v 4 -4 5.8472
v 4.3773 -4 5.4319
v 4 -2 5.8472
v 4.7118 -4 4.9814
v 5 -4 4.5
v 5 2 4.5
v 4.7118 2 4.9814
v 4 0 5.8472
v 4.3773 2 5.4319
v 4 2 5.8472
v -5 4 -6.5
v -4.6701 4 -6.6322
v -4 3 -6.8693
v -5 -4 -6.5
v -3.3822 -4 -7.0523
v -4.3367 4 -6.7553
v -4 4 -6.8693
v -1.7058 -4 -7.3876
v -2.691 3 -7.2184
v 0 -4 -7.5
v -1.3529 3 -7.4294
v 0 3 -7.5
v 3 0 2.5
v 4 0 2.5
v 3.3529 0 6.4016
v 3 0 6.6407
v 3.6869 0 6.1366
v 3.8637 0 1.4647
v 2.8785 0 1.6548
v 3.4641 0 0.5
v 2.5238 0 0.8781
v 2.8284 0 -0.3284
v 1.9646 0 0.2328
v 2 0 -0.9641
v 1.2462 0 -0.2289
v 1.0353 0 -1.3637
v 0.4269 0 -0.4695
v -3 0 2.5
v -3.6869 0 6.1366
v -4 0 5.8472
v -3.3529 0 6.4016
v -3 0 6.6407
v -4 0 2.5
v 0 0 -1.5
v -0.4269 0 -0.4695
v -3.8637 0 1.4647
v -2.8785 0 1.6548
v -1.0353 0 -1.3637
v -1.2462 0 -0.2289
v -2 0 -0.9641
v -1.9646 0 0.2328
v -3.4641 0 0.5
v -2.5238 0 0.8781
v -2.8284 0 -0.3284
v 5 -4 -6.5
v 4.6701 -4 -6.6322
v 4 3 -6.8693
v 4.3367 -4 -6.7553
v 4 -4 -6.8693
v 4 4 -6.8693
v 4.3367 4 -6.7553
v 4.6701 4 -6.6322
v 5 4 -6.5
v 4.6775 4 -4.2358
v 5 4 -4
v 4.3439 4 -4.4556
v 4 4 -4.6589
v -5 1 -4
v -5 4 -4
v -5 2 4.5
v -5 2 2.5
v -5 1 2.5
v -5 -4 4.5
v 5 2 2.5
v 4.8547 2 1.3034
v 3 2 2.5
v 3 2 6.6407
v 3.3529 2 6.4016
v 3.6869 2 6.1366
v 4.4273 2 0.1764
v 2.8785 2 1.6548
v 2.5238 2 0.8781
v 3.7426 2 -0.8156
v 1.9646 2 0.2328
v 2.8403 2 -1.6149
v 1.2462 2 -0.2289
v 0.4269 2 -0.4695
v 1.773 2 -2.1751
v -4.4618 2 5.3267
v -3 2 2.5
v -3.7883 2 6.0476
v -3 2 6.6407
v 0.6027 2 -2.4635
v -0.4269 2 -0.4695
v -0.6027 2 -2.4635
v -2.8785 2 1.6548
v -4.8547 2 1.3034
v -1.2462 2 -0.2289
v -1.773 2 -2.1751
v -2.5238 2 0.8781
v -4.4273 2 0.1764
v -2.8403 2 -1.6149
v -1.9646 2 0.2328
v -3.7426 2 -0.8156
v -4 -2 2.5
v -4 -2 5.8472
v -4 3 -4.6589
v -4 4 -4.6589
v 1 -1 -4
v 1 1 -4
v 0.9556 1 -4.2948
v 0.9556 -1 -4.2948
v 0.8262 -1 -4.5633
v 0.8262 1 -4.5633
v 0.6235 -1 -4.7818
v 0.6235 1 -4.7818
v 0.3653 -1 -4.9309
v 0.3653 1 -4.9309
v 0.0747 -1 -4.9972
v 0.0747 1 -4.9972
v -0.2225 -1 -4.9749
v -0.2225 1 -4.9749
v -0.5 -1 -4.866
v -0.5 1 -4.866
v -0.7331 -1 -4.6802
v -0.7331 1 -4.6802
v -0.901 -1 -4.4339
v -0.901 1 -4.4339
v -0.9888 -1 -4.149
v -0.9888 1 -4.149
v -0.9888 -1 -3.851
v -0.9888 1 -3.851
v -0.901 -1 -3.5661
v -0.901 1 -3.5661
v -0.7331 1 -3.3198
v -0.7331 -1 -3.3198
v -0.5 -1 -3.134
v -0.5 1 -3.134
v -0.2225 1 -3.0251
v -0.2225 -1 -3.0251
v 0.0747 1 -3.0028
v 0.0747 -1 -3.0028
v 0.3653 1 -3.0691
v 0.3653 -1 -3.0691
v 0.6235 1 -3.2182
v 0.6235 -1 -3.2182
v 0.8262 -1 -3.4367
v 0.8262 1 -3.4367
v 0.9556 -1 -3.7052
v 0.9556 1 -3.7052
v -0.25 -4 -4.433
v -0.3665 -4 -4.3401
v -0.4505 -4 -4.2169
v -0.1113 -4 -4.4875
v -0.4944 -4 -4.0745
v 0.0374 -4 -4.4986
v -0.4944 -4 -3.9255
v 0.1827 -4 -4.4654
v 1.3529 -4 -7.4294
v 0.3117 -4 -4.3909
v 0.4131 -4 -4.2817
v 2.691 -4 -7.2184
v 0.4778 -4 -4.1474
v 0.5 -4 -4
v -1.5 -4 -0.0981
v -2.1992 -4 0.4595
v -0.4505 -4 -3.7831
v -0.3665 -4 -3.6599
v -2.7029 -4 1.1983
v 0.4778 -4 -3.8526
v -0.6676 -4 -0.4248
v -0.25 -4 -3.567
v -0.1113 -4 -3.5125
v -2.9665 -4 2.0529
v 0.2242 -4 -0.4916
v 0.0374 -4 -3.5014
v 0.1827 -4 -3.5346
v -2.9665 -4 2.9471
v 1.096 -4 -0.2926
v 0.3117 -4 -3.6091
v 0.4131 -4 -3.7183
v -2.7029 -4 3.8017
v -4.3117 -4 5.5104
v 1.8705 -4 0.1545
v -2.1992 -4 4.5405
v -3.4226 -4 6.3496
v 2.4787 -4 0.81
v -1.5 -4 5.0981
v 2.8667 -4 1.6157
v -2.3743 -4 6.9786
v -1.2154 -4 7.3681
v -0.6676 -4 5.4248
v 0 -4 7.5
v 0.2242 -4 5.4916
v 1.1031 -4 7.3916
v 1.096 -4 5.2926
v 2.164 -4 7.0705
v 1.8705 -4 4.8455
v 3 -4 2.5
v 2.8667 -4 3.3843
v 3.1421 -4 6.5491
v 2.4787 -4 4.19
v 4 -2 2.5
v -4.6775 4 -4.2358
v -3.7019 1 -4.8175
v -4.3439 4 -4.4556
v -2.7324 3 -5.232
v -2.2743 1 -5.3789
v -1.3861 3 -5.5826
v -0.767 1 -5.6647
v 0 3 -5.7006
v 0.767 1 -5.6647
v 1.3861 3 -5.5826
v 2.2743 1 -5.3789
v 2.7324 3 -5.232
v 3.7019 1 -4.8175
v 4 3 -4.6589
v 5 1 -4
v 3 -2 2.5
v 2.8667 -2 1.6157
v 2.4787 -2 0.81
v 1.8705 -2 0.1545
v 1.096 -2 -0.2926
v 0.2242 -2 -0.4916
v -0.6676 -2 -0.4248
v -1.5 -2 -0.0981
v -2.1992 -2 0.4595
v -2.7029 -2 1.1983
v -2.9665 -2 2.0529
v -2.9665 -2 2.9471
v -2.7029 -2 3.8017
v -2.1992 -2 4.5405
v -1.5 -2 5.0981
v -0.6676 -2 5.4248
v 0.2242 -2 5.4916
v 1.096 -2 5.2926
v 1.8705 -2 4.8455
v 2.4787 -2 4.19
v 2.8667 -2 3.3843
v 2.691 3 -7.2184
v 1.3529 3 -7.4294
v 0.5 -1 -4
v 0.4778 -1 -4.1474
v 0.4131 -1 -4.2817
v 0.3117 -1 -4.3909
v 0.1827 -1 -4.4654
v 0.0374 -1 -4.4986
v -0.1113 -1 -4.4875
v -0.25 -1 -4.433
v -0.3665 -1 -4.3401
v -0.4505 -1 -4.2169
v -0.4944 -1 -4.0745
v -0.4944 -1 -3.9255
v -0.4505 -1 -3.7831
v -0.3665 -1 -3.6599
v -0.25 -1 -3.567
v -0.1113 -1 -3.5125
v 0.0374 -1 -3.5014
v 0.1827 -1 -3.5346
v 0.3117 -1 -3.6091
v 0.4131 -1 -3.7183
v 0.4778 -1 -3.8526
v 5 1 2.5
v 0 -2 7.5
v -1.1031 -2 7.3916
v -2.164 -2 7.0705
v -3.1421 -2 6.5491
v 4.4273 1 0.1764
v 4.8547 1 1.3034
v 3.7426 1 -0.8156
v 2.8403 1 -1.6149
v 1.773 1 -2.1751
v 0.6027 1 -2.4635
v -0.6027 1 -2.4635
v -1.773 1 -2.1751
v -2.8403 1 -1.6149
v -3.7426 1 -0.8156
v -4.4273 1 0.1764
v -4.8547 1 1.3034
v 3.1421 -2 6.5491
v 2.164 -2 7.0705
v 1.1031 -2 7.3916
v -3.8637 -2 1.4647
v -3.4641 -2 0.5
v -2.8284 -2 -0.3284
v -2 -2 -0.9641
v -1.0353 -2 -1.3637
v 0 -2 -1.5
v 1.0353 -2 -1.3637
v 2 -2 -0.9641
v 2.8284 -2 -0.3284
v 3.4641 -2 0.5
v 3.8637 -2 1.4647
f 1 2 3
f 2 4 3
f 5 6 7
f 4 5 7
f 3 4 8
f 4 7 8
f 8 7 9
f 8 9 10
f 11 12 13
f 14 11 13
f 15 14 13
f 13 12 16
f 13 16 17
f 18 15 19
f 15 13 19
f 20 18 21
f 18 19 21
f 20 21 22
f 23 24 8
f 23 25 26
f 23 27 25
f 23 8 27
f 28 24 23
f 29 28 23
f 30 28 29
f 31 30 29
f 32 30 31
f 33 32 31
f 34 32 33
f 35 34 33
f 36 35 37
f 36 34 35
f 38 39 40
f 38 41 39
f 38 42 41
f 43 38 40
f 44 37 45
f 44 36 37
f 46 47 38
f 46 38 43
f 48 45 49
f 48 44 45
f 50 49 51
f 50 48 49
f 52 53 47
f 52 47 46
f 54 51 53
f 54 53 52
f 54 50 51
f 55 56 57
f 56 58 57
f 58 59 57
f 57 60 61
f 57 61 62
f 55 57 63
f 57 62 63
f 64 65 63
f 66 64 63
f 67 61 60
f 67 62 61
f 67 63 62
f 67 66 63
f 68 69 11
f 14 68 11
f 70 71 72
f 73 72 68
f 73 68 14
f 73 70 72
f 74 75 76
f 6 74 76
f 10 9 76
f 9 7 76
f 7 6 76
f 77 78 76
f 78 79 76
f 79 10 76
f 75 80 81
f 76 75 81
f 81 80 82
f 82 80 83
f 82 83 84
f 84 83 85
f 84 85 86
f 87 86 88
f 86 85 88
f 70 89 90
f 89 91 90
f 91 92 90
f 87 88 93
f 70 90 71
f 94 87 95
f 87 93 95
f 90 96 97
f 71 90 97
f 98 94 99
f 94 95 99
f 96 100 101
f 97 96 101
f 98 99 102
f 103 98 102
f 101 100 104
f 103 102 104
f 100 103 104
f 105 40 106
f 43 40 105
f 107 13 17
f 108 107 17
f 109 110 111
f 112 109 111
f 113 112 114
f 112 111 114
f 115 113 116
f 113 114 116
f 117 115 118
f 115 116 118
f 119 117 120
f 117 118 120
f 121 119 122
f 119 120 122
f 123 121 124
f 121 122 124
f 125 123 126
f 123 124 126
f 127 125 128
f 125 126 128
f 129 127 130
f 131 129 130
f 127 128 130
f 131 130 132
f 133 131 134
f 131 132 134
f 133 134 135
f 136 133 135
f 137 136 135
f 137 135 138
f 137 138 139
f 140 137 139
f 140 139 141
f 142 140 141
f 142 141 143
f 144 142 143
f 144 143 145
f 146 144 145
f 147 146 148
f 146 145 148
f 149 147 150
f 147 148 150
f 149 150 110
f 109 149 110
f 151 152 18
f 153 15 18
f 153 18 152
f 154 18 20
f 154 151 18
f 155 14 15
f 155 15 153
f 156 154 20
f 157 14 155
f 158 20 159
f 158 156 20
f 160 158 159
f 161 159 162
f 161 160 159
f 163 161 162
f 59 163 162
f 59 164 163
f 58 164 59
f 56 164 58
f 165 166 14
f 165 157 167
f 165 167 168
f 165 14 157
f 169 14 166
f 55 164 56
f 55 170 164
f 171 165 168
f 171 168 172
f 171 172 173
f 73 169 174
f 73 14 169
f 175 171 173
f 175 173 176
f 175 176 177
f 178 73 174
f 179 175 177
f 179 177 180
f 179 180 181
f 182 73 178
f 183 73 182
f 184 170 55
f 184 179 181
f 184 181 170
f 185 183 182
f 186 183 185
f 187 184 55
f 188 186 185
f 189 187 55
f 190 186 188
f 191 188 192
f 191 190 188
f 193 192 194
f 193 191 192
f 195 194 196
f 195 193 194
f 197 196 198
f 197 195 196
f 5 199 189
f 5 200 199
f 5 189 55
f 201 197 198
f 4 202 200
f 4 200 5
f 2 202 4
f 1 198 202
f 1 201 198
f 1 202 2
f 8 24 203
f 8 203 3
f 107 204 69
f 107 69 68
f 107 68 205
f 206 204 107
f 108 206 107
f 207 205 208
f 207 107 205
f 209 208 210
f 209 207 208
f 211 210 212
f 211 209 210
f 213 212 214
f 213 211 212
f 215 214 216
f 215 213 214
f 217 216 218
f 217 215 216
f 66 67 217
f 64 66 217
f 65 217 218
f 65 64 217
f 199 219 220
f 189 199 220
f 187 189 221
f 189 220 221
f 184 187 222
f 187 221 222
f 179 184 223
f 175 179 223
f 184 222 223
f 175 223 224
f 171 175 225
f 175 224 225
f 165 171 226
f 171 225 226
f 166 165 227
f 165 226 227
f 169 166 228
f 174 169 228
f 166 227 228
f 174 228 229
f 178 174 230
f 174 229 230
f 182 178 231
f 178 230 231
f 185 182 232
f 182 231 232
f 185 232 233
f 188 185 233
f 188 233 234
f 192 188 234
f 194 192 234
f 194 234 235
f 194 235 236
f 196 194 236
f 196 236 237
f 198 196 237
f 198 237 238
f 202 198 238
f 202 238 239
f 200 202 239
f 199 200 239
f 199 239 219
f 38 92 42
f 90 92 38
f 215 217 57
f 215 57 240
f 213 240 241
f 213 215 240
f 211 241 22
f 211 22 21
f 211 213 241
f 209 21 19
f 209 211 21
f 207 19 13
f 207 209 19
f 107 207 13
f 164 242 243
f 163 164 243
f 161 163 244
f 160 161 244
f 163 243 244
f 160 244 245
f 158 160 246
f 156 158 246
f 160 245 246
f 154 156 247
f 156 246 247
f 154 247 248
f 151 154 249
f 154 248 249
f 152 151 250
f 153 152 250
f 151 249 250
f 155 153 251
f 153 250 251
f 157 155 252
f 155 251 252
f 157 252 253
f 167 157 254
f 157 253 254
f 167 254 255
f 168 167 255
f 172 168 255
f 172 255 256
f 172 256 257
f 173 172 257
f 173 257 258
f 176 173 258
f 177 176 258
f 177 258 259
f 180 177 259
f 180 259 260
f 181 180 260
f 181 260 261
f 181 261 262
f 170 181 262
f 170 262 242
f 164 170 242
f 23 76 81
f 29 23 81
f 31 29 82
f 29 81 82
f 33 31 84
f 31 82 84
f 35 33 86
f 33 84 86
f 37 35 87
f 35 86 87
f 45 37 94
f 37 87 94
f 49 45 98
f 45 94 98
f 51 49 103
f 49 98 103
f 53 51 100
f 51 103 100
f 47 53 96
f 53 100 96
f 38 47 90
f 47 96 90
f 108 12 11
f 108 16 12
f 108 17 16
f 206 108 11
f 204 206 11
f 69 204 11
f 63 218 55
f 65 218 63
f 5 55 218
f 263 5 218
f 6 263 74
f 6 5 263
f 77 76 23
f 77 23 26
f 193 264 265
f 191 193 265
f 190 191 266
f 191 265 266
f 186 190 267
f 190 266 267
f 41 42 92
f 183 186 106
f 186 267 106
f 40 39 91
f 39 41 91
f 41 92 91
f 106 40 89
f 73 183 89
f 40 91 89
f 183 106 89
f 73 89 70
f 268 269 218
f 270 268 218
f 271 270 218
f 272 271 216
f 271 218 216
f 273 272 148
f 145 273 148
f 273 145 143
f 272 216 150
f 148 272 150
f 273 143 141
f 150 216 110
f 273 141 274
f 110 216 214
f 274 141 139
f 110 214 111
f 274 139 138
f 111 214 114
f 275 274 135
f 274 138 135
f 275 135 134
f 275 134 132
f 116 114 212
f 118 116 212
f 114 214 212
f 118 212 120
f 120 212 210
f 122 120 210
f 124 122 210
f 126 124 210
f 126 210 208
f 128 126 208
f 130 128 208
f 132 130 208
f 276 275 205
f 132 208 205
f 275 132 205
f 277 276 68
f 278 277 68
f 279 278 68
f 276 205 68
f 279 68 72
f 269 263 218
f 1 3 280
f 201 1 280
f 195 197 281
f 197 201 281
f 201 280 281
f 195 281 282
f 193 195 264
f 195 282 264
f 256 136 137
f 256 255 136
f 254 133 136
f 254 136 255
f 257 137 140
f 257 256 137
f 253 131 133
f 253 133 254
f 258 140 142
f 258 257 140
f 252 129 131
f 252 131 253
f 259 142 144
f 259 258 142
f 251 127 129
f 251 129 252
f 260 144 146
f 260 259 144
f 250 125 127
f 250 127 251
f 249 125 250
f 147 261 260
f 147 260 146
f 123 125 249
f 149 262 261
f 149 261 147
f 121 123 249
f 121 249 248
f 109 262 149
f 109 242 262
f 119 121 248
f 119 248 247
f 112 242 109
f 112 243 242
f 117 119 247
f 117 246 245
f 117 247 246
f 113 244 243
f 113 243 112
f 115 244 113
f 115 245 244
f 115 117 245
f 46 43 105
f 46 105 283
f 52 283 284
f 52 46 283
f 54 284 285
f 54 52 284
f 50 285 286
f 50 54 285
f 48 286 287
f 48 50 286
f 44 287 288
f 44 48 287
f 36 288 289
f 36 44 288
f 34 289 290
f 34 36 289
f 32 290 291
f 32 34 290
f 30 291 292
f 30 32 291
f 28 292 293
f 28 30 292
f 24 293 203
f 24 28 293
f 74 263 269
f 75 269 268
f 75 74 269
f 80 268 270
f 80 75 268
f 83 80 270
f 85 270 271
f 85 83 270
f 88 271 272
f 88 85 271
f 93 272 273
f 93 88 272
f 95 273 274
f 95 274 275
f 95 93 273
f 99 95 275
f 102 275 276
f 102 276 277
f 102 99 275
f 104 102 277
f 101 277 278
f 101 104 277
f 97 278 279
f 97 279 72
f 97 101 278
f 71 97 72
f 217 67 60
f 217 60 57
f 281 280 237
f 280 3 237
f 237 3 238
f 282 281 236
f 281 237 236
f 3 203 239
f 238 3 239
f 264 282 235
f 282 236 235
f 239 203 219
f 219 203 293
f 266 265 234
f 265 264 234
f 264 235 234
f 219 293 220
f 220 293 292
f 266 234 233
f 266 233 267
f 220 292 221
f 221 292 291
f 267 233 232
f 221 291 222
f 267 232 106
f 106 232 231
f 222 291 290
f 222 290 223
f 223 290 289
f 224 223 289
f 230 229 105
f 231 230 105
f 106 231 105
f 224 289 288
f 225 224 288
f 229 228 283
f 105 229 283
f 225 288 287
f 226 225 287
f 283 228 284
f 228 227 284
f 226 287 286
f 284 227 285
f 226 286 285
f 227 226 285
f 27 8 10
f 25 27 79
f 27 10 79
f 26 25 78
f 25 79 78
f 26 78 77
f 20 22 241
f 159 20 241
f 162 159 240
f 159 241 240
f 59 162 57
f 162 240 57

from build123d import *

# Parameters (mm, degrees)
BOSS_EXTRUDE1_DEPTH = 7.5
SKETCH2_R           = 0.5
SKETCH2_R_2         = 3
CUT_EXTRUDE1_DEPTH  = 15
CUT_EXTRUDE2_DEPTH  = 3
CUT_EXTRUDE3_DEPTH  = 2
CUT_EXTRUDE4_DEPTH  = 2
CUT_EXTRUDE5_DEPTH  = 3
SKETCH8_R           = 1
CUT_EXTRUDE6_DEPTH  = 2


with BuildPart() as part:
    # Sketch1 → Boss-Extrude1 (new body, symmetric)
    with BuildSketch(Plane.XY):
        Polygon((-5, 4), (-5, -4), (5, -4), (5, 4), (4, 4), (4, 3), (-4, 3), (-4, 4), align=None)
    extrude(amount=BOSS_EXTRUDE1_DEPTH, both=True)

    # Sketch2 → Cut-Extrude1 (cut)
    with BuildSketch(Plane(origin=(0, 4, 0), x_dir=(1, 0, 0), z_dir=(0, 1, 0))):
        with BuildLine():
            Line((-5, 7.5), (-5, 6.5))
            ThreePointArc((-5, 6.5), (-2.549509757, 7.247548784), (0, 7.5))
            Line((0, 7.5), (-5, 7.5))
        make_face()
        with BuildLine():
            Line((4, 7.5), (0, 7.5))
            ThreePointArc((0, 7.5), (2.02470746, 7.341361287), (4, 6.869316877))
            Line((4, 6.869316877), (4, 7.5))
        make_face()
        with BuildLine():
            Line((5, 7.5), (4, 7.5))
            Line((4, 7.5), (4, 6.869316877))
            ThreePointArc((4, 6.869316877), (4.503787155, 6.694912926), (5, 6.5))
            Line((5, 6.5), (5, 7.5))
        make_face()
        with Locations((0, 4)):
            Circle(SKETCH2_R)
        with BuildLine():
            Line((-5, -7.5), (0, -7.5))
            ThreePointArc((0, -7.5), (-2.915475947, -6.692459912), (-5, -4.5))
            Line((-5, -4.5), (-5, -7.5))
        make_face()
        with BuildLine():
            ThreePointArc((5, -4.5), (4.550135794, -5.210813958), (4, -5.847198193))
            Line((4, -5.847198193), (4, -7.5))
            Line((4, -7.5), (5, -7.5))
            Line((5, -7.5), (5, -4.5))
        make_face()
        with BuildLine():
            Line((4, -7.5), (4, -5.847198193))
            ThreePointArc((4, -5.847198193), (2.164009809, -7.070524628), (0, -7.5))
            Line((0, -7.5), (4, -7.5))
        make_face()
        with Locations((0, -2.5)):
            Circle(SKETCH2_R_2)
    extrude(amount=-CUT_EXTRUDE1_DEPTH, mode=Mode.SUBTRACT)

    # Sketch4 → Cut-Extrude2 (cut)
    with BuildSketch(Plane(origin=(0, 3, 0), x_dir=(1, 0, 0), z_dir=(0, 1, 0))):
        with BuildLine():
            Line((3, -2.5), (3, -9.188092465))
            ThreePointArc((3, -9.188092465), (0, -12.188092465), (-3, -9.188092465))
            Line((-3, -9.188092465), (-3, -2.5))
            ThreePointArc((-3, -2.5), (0, 0.5), (3, -2.5))
        make_face()
    extrude(amount=-CUT_EXTRUDE2_DEPTH, mode=Mode.SUBTRACT)

    # Sketch5 → Cut-Extrude3 (cut)
    with BuildSketch(Plane(origin=(0, 0, 0), x_dir=(1, 0, 0), z_dir=(0, 1, 0))):
        with BuildLine():
            Line((4, -2.5), (4, -8.475889446))
            ThreePointArc((4, -8.475889446), (0, -12.475889446), (-4, -8.475889446))
            Line((-4, -8.475889446), (-4, -2.5))
            ThreePointArc((-4, -2.5), (0, 1.5), (4, -2.5))
        make_face()
    extrude(amount=-CUT_EXTRUDE3_DEPTH, mode=Mode.SUBTRACT)

    # Sketch6 → Cut-Extrude4 (cut)
    with BuildSketch(Plane(origin=(0, 4, 0), x_dir=(1, 0, 0), z_dir=(0, 1, 0))):
        with BuildLine():
            Line((5, -2.5), (5, -8.536359525))
            ThreePointArc((5, -8.536359525), (0, -13.536359525), (-5, -8.536359525))
            Line((-5, -8.536359525), (-5, -2.5))
            ThreePointArc((-5, -2.5), (0, 2.5), (5, -2.5))
        make_face()
    extrude(amount=-CUT_EXTRUDE4_DEPTH, mode=Mode.SUBTRACT)

    # Sketch7 → Cut-Extrude5 (cut)
    with BuildSketch(Plane(origin=(0, 4, 0), x_dir=(1, 0, 0), z_dir=(0, 1, 0))):
        with BuildLine():
            Line((-5, -2.5), (-5, 4))
            ThreePointArc((-5, 4), (0, 5.700609733), (5, 4))
            Line((5, 4), (5, -2.5))
            ThreePointArc((5, -2.5), (0, 2.5), (-5, -2.5))
        make_face()
    extrude(amount=-CUT_EXTRUDE5_DEPTH, mode=Mode.SUBTRACT)

    # Sketch8 → Cut-Extrude6 (cut)
    with BuildSketch(Plane(origin=(0, 1, 0), x_dir=(1, 0, 0), z_dir=(0, 1, 0))):
        with Locations((0, 4)):
            Circle(SKETCH8_R)
    extrude(amount=-CUT_EXTRUDE6_DEPTH, mode=Mode.SUBTRACT)


solid = part.part
